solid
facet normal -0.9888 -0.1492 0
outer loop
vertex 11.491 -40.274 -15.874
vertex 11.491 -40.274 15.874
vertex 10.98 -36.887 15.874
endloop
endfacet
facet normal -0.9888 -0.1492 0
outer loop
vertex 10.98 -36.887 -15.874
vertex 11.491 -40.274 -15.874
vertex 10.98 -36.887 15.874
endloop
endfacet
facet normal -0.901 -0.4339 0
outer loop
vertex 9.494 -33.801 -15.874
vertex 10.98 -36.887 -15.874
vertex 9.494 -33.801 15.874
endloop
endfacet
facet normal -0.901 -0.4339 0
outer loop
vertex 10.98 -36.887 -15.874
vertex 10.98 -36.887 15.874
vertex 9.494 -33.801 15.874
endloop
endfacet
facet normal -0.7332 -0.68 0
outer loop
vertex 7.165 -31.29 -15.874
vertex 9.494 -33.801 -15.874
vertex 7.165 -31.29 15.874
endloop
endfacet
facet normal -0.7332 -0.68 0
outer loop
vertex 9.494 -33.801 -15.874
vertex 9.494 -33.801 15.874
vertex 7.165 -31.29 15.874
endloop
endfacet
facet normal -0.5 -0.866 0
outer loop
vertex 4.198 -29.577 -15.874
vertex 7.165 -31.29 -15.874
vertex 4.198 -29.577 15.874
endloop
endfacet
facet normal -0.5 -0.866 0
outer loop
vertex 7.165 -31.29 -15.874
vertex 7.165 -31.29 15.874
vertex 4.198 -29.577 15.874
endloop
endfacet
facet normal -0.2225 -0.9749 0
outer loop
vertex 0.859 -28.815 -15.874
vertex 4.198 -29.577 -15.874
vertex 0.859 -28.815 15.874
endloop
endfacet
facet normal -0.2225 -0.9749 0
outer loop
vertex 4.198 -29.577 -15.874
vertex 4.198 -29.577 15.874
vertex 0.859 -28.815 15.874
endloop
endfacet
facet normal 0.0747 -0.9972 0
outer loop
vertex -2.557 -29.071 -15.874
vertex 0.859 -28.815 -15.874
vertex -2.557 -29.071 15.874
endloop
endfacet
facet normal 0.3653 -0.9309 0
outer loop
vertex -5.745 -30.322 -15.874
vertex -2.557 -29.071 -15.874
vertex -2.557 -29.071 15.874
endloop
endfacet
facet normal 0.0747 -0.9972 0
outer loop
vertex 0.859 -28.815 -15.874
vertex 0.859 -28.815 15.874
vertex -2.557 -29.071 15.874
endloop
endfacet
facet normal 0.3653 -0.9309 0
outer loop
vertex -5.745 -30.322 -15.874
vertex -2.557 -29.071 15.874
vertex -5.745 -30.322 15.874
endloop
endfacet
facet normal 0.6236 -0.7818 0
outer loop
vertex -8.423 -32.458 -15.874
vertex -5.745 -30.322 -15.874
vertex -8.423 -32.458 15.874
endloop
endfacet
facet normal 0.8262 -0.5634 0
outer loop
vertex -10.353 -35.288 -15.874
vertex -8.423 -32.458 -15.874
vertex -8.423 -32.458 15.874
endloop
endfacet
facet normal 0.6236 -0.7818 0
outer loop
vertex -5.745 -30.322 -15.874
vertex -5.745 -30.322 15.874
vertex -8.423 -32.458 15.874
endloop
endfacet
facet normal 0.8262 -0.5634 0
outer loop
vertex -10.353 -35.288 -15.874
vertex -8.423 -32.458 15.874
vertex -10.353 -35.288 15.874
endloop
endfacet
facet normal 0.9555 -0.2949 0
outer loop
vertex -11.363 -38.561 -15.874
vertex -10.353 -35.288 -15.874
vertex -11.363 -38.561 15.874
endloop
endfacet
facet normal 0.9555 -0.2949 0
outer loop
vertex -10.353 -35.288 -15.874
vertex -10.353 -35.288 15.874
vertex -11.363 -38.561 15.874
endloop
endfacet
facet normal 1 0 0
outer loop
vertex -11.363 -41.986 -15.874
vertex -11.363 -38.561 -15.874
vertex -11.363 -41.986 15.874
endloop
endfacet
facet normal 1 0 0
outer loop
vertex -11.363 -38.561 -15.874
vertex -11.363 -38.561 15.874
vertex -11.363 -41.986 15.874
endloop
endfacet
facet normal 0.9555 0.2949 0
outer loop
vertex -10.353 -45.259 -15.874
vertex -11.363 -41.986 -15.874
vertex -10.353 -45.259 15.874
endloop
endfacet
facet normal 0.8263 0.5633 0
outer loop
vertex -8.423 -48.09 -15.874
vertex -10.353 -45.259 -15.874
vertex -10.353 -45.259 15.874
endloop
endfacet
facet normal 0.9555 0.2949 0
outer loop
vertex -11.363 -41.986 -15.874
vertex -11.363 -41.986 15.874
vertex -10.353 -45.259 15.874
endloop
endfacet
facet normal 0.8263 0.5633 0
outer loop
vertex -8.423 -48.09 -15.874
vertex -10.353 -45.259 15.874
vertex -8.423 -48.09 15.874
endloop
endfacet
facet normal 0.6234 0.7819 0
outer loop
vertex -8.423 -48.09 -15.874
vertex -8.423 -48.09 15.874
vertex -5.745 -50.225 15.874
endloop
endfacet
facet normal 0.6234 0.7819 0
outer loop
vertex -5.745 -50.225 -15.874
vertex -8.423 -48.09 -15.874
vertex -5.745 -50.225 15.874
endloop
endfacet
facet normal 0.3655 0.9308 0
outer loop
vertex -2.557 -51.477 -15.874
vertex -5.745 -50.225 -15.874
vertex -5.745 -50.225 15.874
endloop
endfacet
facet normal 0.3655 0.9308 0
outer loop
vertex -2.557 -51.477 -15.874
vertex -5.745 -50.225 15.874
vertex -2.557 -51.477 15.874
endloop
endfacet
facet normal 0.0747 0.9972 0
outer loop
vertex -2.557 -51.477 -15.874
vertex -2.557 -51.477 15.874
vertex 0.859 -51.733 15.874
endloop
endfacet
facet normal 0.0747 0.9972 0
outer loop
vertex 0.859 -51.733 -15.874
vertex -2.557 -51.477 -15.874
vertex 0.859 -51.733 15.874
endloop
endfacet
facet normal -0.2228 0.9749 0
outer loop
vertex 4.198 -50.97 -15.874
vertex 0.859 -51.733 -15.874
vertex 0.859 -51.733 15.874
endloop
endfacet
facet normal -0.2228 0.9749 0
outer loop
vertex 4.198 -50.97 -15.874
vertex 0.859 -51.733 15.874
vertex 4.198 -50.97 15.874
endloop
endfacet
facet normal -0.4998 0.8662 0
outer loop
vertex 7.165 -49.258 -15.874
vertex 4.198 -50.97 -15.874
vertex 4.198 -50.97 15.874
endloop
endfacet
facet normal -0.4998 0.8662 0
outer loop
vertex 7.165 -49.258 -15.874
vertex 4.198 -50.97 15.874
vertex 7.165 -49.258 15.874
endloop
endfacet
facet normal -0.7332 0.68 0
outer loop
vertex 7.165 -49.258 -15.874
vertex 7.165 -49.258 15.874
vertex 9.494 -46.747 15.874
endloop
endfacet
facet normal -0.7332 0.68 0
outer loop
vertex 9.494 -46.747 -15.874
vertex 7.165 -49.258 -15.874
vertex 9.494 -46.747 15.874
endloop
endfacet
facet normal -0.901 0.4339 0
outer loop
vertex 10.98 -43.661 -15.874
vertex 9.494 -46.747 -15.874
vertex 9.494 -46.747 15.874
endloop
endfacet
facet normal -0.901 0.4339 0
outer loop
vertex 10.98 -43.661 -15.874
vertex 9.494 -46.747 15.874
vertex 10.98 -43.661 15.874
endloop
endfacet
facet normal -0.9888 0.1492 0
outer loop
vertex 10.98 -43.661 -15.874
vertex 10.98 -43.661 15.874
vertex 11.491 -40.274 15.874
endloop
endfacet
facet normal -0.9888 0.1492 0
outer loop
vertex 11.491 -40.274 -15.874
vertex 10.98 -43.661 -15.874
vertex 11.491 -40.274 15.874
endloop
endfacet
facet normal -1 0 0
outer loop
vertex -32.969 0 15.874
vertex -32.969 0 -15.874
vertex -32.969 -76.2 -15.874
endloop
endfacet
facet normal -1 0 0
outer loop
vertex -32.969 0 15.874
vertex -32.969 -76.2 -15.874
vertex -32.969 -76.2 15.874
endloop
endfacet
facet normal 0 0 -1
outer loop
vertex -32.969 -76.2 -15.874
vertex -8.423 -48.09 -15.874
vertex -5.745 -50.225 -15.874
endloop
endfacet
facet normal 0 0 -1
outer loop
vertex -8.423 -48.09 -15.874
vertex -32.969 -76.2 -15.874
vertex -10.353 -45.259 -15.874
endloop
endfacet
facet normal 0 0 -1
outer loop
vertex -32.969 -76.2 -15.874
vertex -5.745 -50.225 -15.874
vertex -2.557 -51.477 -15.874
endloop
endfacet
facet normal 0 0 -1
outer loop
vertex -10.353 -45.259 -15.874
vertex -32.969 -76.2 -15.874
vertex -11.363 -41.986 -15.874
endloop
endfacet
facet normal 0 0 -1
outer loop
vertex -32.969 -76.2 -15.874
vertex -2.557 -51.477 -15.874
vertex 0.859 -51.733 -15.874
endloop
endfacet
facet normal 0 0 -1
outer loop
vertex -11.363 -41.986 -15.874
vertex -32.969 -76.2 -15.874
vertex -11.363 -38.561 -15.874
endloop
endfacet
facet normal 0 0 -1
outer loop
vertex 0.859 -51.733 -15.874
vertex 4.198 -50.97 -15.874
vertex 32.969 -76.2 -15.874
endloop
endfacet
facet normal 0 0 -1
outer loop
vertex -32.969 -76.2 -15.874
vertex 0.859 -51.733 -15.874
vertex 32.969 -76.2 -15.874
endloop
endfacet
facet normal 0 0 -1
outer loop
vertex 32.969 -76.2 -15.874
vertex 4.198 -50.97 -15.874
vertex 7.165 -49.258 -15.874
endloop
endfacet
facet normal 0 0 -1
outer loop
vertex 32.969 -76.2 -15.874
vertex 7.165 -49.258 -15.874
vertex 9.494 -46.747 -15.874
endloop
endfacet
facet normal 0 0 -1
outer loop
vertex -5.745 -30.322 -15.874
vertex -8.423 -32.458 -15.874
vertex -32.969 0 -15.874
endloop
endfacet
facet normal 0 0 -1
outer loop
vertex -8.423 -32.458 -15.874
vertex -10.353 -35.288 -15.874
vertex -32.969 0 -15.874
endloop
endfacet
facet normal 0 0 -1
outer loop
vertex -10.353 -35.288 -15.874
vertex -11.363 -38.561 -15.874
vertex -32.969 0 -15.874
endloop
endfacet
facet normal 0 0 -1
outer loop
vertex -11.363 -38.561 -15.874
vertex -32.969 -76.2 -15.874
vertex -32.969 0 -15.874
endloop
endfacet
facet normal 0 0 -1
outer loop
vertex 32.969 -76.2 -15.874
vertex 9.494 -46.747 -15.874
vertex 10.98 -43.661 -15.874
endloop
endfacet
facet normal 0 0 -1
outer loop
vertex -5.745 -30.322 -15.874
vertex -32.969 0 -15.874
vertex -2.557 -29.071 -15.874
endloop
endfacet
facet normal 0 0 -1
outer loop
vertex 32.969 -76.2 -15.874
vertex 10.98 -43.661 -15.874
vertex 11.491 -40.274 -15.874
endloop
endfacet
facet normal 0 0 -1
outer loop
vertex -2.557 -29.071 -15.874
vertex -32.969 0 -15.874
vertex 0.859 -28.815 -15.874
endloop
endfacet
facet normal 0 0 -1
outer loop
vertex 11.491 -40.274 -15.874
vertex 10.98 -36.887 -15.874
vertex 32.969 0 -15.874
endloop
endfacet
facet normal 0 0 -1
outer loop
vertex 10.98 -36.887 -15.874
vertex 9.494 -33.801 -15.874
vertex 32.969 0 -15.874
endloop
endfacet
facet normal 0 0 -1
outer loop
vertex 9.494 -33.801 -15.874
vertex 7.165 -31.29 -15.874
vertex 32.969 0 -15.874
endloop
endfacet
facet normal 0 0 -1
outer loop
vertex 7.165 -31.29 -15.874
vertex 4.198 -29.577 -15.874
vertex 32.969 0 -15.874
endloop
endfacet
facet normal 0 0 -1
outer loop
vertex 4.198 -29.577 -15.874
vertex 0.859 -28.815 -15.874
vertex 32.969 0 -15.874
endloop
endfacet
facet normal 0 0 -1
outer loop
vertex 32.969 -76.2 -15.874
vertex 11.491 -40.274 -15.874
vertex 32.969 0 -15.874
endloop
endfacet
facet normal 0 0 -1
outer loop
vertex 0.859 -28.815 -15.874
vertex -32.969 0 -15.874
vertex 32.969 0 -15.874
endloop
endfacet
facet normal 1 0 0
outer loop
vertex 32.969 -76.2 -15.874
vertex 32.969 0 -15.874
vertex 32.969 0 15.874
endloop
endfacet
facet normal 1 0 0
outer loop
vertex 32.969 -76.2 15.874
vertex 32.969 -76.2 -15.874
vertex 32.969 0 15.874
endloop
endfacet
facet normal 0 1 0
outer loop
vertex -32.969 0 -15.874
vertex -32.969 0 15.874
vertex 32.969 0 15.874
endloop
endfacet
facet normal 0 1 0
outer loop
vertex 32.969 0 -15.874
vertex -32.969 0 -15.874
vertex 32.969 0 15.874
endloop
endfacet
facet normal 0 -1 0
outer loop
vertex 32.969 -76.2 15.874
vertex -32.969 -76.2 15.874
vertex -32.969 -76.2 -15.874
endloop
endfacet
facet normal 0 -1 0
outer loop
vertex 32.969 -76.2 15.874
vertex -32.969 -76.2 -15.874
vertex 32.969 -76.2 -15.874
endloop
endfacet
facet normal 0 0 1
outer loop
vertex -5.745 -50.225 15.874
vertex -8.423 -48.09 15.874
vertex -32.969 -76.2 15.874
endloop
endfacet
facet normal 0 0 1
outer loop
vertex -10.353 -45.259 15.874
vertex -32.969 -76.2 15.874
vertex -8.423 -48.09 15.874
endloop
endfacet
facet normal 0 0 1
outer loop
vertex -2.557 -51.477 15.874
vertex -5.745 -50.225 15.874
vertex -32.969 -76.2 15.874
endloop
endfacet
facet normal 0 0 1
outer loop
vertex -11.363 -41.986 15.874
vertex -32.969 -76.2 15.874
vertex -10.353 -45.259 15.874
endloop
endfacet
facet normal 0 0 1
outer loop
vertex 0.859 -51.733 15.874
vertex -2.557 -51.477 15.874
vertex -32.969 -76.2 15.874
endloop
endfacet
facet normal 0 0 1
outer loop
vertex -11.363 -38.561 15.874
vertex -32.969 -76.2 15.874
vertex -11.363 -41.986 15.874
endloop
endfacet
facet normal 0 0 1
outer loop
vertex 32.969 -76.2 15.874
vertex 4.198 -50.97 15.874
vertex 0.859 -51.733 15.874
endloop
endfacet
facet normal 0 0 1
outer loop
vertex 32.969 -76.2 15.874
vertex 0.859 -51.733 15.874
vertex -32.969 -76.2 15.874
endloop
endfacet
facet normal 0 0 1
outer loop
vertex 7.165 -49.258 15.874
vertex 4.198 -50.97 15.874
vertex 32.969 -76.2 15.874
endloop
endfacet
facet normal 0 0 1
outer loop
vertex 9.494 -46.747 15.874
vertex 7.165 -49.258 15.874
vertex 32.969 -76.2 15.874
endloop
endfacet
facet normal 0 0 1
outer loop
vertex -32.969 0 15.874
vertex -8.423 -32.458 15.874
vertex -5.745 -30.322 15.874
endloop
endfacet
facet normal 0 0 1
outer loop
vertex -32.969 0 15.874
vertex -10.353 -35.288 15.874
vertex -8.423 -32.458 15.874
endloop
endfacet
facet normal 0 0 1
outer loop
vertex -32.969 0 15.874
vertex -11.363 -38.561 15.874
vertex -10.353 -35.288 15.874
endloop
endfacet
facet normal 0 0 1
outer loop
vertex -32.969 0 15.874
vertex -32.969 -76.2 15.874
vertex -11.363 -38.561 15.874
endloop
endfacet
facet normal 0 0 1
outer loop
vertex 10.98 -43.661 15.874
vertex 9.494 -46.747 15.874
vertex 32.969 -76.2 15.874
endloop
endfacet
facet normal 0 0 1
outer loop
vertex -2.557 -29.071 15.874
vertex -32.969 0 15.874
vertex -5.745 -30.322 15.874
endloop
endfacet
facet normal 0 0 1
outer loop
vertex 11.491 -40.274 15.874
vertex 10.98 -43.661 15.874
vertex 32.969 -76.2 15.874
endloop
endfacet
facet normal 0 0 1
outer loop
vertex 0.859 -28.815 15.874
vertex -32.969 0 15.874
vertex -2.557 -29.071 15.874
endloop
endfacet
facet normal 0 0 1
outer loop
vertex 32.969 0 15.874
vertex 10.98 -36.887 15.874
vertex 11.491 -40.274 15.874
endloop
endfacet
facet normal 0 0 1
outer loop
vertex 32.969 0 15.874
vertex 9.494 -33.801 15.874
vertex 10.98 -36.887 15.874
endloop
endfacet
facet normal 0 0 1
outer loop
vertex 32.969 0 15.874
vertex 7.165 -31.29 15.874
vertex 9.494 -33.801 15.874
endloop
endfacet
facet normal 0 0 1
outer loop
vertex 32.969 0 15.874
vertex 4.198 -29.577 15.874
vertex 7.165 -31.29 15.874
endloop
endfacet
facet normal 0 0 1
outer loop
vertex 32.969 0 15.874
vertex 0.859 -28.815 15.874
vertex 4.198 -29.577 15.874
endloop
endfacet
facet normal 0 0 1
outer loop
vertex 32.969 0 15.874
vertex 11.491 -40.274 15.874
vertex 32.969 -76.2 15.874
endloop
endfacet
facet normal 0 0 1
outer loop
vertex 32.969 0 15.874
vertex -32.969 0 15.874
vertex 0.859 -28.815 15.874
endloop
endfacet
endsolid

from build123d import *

# Parameters (mm, degrees)
F0_W     = 65.93775
F0_H     = 31.747806
F1_DEPTH = 76.2
F2_R     = 11.490994
F3_DEPTH = 31.748807


with BuildPart() as f1:
    # F0 (on Front) → F1 (new body)
    with BuildSketch(Plane.XZ):
        Rectangle(F0_W, F0_H)
    extrude(amount=F1_DEPTH)

    # F2 (on face) → F3 (cut, through all)
    with BuildSketch(Plane.XY.offset(15.873903)):
        with Locations((0, -40.273719)):
            Circle(F2_R)
    extrude(amount=-F3_DEPTH, mode=Mode.SUBTRACT)


solid = f1.part
